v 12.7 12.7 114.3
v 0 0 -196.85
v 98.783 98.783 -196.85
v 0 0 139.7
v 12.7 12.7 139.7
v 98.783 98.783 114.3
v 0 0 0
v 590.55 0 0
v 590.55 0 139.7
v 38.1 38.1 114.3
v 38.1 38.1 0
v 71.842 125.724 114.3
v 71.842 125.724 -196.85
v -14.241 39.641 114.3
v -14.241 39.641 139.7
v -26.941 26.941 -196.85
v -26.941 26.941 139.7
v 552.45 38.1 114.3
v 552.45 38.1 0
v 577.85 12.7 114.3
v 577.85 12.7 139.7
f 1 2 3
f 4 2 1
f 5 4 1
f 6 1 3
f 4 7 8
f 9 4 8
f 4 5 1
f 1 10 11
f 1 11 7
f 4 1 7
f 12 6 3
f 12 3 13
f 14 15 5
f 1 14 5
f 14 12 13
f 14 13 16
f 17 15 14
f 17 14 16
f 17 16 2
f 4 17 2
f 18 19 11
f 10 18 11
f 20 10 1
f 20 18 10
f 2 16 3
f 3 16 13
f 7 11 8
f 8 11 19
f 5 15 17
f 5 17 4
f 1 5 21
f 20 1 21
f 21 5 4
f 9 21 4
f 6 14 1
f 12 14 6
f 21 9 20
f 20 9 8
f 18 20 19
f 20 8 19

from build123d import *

# Parameters (mm, degrees)
F1_DEPTH = 139.7
F2_W     = 590.55
F2_H     = 25.4
F3_DEPTH = 25.4
F5_DEPTH = 336.55
F7_DEPTH = 25.4


with BuildPart() as f1:
    # F0 (on Top) → F1 (new body)
    with BuildSketch(Plane.XY):
        Polygon((38.1, 38.1), (0, 0), (590.55, 0), (552.45, 38.1), align=None)
    extrude(amount=F1_DEPTH)

    # F2 (on face) → F3 (cut)
    with BuildSketch(Plane.XY.offset(139.7)):
        with Locations((295.275, 25.4)):
            Rectangle(F2_W, F2_H)
    extrude(amount=-F3_DEPTH, mode=Mode.SUBTRACT)


with BuildPart() as f5:
    # F4 (on face) → F5 (new body)
    with BuildSketch(Plane.XY.offset(139.7)):
        Polygon((-26.940768, 26.940768), (0, 0), (98.782817, 98.782817), (71.842049, 125.723586), align=None)
    extrude(amount=-F5_DEPTH)

    # F6 (on face) → F7 (cut)
    with BuildSketch(Plane.XY.offset(139.7)):
        Polygon((98.782817, 98.782817), (71.842049, 125.723586), (-14.240768, 39.640768), (12.7, 12.7), align=None)
    extrude(amount=-F7_DEPTH, mode=Mode.SUBTRACT)


solid = Compound([f1.part, f5.part])
